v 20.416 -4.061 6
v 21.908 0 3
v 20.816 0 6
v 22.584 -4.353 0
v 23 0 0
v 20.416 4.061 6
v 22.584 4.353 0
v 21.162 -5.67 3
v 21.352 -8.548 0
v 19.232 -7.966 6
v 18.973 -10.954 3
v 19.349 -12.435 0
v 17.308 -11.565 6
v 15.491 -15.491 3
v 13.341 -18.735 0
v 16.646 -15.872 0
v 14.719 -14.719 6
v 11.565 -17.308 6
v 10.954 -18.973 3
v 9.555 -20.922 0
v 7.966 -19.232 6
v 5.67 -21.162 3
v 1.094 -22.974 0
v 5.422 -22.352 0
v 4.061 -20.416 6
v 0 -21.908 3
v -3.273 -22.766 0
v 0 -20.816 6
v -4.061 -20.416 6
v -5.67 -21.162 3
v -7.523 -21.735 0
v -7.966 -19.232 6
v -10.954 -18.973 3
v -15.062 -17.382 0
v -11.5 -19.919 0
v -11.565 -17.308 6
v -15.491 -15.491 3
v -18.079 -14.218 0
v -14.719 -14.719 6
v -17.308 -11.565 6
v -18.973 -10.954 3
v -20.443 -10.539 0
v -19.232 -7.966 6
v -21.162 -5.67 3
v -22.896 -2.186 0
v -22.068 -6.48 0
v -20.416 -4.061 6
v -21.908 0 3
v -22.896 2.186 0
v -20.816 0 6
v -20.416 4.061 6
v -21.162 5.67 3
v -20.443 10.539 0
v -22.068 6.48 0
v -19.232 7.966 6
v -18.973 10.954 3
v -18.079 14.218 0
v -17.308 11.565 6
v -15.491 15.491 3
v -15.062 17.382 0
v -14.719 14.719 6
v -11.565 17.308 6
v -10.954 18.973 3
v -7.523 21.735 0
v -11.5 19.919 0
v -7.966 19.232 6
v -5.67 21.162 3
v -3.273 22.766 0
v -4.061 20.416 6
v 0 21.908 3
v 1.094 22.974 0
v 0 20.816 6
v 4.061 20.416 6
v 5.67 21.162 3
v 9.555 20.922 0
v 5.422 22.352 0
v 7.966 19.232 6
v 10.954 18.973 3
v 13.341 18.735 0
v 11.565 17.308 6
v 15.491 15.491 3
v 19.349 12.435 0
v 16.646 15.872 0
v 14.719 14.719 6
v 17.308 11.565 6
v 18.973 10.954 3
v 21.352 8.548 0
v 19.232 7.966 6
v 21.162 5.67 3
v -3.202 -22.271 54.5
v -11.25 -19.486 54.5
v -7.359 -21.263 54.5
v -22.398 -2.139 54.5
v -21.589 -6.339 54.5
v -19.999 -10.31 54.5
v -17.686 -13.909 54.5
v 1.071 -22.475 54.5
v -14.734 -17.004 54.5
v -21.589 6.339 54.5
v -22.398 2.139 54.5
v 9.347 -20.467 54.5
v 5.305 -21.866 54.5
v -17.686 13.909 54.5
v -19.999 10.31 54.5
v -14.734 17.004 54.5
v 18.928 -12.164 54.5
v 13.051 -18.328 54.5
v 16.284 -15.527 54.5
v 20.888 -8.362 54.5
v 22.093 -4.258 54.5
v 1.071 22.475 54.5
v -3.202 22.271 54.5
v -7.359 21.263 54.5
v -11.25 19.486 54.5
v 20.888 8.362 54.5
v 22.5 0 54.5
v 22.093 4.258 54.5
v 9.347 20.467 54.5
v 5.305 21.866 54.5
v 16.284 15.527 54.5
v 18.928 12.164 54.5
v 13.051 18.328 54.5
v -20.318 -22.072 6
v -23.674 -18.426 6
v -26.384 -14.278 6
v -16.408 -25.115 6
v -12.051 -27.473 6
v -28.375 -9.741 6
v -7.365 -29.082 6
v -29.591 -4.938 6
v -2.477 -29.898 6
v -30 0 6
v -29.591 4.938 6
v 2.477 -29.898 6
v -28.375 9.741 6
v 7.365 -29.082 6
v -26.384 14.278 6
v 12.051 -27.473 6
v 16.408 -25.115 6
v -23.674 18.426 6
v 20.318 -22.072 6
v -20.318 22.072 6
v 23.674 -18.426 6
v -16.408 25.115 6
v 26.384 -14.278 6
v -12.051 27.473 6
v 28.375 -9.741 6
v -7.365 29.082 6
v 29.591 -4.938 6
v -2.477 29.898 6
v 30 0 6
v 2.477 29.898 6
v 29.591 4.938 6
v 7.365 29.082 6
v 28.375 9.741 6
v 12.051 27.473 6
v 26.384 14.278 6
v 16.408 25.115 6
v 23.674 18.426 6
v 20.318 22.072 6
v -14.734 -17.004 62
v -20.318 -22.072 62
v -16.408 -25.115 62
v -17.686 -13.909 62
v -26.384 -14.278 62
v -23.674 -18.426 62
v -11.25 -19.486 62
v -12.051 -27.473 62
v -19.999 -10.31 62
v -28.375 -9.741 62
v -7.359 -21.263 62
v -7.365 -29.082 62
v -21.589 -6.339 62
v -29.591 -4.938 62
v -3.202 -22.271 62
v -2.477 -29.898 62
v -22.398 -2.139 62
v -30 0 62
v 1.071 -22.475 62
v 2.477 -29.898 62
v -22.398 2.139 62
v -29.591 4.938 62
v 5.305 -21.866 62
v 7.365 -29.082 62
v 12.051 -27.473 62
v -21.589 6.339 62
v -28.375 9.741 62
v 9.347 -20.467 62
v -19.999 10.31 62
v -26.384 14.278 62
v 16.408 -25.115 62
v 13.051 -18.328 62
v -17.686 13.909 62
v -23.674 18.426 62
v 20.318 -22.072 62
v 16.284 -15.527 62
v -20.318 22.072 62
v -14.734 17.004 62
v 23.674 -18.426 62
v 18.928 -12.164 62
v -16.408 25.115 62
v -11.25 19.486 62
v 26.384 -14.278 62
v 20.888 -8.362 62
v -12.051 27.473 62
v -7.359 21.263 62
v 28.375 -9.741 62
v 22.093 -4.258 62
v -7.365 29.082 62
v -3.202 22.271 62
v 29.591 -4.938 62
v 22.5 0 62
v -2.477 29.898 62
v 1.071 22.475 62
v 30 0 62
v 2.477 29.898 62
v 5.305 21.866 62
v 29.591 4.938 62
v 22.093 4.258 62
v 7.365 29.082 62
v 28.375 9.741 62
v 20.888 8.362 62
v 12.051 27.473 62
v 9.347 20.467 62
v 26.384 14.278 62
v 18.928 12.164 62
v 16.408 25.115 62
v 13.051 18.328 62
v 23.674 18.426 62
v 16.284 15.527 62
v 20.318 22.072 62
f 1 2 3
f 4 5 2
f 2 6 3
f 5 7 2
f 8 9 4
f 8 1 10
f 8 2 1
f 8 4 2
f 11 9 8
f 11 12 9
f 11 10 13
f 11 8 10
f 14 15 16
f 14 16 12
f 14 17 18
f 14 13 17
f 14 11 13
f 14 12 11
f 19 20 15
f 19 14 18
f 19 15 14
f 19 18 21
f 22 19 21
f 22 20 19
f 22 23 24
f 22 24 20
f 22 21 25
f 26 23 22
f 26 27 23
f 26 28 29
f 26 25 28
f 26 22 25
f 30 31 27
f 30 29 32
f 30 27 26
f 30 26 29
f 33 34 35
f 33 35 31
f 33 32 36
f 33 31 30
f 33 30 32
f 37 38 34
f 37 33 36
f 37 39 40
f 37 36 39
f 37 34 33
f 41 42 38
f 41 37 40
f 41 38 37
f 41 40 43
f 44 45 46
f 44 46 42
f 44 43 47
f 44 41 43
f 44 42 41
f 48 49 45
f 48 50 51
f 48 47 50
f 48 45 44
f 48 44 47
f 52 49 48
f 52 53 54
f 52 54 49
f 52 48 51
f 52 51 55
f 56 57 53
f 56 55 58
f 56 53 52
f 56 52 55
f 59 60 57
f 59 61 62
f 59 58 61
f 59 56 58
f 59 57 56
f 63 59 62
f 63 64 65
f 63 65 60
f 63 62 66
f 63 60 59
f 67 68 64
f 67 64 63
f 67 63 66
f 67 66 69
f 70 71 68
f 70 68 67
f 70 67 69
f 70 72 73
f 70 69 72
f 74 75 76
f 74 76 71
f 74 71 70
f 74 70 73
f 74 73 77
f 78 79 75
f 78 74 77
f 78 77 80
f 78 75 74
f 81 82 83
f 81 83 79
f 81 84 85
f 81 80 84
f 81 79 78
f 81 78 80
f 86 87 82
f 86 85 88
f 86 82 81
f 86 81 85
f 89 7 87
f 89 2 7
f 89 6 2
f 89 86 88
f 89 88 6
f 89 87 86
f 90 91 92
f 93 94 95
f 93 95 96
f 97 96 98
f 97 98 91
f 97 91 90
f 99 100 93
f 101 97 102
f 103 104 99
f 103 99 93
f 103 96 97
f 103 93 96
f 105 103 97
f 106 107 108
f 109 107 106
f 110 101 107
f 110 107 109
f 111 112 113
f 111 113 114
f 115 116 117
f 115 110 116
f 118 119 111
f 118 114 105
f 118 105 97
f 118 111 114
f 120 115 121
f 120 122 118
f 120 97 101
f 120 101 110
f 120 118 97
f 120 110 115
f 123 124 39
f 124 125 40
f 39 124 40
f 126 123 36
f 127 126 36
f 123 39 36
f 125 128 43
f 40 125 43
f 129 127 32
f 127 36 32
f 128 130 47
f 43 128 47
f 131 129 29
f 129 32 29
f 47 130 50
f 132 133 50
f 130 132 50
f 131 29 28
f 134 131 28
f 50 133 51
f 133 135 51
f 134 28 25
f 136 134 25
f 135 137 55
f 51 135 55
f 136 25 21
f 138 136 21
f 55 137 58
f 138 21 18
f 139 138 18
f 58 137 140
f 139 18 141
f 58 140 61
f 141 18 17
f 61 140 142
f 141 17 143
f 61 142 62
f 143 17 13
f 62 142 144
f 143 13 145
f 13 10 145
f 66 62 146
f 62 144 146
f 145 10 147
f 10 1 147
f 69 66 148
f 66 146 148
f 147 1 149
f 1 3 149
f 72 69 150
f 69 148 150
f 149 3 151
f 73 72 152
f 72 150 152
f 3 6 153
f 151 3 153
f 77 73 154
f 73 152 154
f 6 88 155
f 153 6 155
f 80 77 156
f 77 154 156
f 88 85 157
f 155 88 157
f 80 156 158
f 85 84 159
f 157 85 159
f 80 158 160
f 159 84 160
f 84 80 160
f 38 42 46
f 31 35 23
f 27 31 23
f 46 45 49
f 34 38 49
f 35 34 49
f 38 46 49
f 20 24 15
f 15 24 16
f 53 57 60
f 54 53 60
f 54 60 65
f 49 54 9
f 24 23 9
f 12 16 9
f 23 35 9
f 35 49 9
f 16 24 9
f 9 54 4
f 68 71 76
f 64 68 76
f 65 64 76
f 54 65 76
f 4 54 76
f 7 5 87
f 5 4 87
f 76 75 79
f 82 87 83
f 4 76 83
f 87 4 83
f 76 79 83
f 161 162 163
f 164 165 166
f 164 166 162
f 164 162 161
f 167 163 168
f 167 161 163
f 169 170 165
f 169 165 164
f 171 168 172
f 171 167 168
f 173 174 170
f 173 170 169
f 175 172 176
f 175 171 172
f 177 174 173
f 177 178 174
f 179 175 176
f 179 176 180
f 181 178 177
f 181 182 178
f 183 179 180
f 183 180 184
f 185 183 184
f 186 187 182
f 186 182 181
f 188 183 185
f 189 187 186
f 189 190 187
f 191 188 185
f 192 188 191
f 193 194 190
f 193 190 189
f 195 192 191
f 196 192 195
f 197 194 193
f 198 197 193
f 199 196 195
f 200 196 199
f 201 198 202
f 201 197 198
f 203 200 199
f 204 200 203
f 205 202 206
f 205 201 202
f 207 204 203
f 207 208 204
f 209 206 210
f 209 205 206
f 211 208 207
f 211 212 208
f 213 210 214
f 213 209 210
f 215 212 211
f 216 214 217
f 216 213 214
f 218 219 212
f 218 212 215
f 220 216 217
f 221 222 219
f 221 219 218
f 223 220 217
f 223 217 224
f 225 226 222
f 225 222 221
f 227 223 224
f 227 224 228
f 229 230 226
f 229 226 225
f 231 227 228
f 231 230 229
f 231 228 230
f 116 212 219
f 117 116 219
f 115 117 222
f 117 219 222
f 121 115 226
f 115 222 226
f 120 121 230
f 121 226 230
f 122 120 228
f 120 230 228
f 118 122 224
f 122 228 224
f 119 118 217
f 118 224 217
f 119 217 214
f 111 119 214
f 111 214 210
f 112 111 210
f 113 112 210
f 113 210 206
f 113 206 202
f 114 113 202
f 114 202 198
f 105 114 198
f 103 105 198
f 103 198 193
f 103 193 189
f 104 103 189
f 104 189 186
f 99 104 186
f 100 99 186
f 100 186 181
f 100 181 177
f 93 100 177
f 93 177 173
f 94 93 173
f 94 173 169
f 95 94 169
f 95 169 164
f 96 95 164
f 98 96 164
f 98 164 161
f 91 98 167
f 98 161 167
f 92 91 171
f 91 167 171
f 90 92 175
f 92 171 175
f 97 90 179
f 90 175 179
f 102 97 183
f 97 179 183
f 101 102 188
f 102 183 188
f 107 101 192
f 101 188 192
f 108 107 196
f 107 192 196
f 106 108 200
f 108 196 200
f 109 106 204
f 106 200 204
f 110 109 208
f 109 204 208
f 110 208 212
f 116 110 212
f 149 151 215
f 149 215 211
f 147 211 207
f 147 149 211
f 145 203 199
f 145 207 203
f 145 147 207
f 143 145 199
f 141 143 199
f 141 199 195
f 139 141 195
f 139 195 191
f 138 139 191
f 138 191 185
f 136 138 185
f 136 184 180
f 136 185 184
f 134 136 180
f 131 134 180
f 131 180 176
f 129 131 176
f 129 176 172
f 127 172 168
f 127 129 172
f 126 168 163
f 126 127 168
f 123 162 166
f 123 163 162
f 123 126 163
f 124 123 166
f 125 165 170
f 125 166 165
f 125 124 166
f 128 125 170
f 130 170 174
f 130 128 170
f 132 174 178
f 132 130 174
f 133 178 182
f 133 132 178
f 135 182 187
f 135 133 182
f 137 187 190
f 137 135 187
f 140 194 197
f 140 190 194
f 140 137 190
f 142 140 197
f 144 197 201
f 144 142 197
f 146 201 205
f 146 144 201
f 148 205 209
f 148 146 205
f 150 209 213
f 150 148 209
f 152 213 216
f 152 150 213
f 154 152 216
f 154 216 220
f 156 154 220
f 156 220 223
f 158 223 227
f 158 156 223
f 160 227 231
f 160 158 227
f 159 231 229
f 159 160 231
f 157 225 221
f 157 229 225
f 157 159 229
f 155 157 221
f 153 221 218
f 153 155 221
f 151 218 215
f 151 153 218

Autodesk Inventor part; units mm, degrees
ref_plane "YZ Plane" through (0, 0, 0) normal (1, 0, 0) x (0, 1, 0)
ref_plane "XZ Plane" through (0, 0, 0) normal (0, 1, 0) x (-1, 0, 0)
ref_plane "XY Plane" through (0, 0, 0) normal (0, 0, 1) x (1, 0, 0)
sketch "Sketch1" plane through (0, 0, 0) normal (0, 0, 1) x (1, 0, 0)
  circle A0 centre (0, 0) radius 23
  dimension "d0" = 46
extrude "Extrusion1" add sketch "Sketch1" along normal blind 6 draft -20
sketch "Sketch2" plane through (0, 0, 6) normal (0, 0, 1) x (1, 0, 0)
  circle A0 centre (0, 0) radius 30
  dimension "d3" = 60
extrude "Extrusion2" add sketch "Sketch2" along normal blind 56
sketch "Sketch3" plane through (0, 0, 62) normal (0, 0, 1) x (1, 0, 0)
  circle A0 centre (0, 0) radius 22.5
  dimension "d6" = 45
extrude "Extrusion3" cut sketch "Sketch3" against normal blind 7.5
properties part number "olympusTubeLens" material "Aluminum 6061"
